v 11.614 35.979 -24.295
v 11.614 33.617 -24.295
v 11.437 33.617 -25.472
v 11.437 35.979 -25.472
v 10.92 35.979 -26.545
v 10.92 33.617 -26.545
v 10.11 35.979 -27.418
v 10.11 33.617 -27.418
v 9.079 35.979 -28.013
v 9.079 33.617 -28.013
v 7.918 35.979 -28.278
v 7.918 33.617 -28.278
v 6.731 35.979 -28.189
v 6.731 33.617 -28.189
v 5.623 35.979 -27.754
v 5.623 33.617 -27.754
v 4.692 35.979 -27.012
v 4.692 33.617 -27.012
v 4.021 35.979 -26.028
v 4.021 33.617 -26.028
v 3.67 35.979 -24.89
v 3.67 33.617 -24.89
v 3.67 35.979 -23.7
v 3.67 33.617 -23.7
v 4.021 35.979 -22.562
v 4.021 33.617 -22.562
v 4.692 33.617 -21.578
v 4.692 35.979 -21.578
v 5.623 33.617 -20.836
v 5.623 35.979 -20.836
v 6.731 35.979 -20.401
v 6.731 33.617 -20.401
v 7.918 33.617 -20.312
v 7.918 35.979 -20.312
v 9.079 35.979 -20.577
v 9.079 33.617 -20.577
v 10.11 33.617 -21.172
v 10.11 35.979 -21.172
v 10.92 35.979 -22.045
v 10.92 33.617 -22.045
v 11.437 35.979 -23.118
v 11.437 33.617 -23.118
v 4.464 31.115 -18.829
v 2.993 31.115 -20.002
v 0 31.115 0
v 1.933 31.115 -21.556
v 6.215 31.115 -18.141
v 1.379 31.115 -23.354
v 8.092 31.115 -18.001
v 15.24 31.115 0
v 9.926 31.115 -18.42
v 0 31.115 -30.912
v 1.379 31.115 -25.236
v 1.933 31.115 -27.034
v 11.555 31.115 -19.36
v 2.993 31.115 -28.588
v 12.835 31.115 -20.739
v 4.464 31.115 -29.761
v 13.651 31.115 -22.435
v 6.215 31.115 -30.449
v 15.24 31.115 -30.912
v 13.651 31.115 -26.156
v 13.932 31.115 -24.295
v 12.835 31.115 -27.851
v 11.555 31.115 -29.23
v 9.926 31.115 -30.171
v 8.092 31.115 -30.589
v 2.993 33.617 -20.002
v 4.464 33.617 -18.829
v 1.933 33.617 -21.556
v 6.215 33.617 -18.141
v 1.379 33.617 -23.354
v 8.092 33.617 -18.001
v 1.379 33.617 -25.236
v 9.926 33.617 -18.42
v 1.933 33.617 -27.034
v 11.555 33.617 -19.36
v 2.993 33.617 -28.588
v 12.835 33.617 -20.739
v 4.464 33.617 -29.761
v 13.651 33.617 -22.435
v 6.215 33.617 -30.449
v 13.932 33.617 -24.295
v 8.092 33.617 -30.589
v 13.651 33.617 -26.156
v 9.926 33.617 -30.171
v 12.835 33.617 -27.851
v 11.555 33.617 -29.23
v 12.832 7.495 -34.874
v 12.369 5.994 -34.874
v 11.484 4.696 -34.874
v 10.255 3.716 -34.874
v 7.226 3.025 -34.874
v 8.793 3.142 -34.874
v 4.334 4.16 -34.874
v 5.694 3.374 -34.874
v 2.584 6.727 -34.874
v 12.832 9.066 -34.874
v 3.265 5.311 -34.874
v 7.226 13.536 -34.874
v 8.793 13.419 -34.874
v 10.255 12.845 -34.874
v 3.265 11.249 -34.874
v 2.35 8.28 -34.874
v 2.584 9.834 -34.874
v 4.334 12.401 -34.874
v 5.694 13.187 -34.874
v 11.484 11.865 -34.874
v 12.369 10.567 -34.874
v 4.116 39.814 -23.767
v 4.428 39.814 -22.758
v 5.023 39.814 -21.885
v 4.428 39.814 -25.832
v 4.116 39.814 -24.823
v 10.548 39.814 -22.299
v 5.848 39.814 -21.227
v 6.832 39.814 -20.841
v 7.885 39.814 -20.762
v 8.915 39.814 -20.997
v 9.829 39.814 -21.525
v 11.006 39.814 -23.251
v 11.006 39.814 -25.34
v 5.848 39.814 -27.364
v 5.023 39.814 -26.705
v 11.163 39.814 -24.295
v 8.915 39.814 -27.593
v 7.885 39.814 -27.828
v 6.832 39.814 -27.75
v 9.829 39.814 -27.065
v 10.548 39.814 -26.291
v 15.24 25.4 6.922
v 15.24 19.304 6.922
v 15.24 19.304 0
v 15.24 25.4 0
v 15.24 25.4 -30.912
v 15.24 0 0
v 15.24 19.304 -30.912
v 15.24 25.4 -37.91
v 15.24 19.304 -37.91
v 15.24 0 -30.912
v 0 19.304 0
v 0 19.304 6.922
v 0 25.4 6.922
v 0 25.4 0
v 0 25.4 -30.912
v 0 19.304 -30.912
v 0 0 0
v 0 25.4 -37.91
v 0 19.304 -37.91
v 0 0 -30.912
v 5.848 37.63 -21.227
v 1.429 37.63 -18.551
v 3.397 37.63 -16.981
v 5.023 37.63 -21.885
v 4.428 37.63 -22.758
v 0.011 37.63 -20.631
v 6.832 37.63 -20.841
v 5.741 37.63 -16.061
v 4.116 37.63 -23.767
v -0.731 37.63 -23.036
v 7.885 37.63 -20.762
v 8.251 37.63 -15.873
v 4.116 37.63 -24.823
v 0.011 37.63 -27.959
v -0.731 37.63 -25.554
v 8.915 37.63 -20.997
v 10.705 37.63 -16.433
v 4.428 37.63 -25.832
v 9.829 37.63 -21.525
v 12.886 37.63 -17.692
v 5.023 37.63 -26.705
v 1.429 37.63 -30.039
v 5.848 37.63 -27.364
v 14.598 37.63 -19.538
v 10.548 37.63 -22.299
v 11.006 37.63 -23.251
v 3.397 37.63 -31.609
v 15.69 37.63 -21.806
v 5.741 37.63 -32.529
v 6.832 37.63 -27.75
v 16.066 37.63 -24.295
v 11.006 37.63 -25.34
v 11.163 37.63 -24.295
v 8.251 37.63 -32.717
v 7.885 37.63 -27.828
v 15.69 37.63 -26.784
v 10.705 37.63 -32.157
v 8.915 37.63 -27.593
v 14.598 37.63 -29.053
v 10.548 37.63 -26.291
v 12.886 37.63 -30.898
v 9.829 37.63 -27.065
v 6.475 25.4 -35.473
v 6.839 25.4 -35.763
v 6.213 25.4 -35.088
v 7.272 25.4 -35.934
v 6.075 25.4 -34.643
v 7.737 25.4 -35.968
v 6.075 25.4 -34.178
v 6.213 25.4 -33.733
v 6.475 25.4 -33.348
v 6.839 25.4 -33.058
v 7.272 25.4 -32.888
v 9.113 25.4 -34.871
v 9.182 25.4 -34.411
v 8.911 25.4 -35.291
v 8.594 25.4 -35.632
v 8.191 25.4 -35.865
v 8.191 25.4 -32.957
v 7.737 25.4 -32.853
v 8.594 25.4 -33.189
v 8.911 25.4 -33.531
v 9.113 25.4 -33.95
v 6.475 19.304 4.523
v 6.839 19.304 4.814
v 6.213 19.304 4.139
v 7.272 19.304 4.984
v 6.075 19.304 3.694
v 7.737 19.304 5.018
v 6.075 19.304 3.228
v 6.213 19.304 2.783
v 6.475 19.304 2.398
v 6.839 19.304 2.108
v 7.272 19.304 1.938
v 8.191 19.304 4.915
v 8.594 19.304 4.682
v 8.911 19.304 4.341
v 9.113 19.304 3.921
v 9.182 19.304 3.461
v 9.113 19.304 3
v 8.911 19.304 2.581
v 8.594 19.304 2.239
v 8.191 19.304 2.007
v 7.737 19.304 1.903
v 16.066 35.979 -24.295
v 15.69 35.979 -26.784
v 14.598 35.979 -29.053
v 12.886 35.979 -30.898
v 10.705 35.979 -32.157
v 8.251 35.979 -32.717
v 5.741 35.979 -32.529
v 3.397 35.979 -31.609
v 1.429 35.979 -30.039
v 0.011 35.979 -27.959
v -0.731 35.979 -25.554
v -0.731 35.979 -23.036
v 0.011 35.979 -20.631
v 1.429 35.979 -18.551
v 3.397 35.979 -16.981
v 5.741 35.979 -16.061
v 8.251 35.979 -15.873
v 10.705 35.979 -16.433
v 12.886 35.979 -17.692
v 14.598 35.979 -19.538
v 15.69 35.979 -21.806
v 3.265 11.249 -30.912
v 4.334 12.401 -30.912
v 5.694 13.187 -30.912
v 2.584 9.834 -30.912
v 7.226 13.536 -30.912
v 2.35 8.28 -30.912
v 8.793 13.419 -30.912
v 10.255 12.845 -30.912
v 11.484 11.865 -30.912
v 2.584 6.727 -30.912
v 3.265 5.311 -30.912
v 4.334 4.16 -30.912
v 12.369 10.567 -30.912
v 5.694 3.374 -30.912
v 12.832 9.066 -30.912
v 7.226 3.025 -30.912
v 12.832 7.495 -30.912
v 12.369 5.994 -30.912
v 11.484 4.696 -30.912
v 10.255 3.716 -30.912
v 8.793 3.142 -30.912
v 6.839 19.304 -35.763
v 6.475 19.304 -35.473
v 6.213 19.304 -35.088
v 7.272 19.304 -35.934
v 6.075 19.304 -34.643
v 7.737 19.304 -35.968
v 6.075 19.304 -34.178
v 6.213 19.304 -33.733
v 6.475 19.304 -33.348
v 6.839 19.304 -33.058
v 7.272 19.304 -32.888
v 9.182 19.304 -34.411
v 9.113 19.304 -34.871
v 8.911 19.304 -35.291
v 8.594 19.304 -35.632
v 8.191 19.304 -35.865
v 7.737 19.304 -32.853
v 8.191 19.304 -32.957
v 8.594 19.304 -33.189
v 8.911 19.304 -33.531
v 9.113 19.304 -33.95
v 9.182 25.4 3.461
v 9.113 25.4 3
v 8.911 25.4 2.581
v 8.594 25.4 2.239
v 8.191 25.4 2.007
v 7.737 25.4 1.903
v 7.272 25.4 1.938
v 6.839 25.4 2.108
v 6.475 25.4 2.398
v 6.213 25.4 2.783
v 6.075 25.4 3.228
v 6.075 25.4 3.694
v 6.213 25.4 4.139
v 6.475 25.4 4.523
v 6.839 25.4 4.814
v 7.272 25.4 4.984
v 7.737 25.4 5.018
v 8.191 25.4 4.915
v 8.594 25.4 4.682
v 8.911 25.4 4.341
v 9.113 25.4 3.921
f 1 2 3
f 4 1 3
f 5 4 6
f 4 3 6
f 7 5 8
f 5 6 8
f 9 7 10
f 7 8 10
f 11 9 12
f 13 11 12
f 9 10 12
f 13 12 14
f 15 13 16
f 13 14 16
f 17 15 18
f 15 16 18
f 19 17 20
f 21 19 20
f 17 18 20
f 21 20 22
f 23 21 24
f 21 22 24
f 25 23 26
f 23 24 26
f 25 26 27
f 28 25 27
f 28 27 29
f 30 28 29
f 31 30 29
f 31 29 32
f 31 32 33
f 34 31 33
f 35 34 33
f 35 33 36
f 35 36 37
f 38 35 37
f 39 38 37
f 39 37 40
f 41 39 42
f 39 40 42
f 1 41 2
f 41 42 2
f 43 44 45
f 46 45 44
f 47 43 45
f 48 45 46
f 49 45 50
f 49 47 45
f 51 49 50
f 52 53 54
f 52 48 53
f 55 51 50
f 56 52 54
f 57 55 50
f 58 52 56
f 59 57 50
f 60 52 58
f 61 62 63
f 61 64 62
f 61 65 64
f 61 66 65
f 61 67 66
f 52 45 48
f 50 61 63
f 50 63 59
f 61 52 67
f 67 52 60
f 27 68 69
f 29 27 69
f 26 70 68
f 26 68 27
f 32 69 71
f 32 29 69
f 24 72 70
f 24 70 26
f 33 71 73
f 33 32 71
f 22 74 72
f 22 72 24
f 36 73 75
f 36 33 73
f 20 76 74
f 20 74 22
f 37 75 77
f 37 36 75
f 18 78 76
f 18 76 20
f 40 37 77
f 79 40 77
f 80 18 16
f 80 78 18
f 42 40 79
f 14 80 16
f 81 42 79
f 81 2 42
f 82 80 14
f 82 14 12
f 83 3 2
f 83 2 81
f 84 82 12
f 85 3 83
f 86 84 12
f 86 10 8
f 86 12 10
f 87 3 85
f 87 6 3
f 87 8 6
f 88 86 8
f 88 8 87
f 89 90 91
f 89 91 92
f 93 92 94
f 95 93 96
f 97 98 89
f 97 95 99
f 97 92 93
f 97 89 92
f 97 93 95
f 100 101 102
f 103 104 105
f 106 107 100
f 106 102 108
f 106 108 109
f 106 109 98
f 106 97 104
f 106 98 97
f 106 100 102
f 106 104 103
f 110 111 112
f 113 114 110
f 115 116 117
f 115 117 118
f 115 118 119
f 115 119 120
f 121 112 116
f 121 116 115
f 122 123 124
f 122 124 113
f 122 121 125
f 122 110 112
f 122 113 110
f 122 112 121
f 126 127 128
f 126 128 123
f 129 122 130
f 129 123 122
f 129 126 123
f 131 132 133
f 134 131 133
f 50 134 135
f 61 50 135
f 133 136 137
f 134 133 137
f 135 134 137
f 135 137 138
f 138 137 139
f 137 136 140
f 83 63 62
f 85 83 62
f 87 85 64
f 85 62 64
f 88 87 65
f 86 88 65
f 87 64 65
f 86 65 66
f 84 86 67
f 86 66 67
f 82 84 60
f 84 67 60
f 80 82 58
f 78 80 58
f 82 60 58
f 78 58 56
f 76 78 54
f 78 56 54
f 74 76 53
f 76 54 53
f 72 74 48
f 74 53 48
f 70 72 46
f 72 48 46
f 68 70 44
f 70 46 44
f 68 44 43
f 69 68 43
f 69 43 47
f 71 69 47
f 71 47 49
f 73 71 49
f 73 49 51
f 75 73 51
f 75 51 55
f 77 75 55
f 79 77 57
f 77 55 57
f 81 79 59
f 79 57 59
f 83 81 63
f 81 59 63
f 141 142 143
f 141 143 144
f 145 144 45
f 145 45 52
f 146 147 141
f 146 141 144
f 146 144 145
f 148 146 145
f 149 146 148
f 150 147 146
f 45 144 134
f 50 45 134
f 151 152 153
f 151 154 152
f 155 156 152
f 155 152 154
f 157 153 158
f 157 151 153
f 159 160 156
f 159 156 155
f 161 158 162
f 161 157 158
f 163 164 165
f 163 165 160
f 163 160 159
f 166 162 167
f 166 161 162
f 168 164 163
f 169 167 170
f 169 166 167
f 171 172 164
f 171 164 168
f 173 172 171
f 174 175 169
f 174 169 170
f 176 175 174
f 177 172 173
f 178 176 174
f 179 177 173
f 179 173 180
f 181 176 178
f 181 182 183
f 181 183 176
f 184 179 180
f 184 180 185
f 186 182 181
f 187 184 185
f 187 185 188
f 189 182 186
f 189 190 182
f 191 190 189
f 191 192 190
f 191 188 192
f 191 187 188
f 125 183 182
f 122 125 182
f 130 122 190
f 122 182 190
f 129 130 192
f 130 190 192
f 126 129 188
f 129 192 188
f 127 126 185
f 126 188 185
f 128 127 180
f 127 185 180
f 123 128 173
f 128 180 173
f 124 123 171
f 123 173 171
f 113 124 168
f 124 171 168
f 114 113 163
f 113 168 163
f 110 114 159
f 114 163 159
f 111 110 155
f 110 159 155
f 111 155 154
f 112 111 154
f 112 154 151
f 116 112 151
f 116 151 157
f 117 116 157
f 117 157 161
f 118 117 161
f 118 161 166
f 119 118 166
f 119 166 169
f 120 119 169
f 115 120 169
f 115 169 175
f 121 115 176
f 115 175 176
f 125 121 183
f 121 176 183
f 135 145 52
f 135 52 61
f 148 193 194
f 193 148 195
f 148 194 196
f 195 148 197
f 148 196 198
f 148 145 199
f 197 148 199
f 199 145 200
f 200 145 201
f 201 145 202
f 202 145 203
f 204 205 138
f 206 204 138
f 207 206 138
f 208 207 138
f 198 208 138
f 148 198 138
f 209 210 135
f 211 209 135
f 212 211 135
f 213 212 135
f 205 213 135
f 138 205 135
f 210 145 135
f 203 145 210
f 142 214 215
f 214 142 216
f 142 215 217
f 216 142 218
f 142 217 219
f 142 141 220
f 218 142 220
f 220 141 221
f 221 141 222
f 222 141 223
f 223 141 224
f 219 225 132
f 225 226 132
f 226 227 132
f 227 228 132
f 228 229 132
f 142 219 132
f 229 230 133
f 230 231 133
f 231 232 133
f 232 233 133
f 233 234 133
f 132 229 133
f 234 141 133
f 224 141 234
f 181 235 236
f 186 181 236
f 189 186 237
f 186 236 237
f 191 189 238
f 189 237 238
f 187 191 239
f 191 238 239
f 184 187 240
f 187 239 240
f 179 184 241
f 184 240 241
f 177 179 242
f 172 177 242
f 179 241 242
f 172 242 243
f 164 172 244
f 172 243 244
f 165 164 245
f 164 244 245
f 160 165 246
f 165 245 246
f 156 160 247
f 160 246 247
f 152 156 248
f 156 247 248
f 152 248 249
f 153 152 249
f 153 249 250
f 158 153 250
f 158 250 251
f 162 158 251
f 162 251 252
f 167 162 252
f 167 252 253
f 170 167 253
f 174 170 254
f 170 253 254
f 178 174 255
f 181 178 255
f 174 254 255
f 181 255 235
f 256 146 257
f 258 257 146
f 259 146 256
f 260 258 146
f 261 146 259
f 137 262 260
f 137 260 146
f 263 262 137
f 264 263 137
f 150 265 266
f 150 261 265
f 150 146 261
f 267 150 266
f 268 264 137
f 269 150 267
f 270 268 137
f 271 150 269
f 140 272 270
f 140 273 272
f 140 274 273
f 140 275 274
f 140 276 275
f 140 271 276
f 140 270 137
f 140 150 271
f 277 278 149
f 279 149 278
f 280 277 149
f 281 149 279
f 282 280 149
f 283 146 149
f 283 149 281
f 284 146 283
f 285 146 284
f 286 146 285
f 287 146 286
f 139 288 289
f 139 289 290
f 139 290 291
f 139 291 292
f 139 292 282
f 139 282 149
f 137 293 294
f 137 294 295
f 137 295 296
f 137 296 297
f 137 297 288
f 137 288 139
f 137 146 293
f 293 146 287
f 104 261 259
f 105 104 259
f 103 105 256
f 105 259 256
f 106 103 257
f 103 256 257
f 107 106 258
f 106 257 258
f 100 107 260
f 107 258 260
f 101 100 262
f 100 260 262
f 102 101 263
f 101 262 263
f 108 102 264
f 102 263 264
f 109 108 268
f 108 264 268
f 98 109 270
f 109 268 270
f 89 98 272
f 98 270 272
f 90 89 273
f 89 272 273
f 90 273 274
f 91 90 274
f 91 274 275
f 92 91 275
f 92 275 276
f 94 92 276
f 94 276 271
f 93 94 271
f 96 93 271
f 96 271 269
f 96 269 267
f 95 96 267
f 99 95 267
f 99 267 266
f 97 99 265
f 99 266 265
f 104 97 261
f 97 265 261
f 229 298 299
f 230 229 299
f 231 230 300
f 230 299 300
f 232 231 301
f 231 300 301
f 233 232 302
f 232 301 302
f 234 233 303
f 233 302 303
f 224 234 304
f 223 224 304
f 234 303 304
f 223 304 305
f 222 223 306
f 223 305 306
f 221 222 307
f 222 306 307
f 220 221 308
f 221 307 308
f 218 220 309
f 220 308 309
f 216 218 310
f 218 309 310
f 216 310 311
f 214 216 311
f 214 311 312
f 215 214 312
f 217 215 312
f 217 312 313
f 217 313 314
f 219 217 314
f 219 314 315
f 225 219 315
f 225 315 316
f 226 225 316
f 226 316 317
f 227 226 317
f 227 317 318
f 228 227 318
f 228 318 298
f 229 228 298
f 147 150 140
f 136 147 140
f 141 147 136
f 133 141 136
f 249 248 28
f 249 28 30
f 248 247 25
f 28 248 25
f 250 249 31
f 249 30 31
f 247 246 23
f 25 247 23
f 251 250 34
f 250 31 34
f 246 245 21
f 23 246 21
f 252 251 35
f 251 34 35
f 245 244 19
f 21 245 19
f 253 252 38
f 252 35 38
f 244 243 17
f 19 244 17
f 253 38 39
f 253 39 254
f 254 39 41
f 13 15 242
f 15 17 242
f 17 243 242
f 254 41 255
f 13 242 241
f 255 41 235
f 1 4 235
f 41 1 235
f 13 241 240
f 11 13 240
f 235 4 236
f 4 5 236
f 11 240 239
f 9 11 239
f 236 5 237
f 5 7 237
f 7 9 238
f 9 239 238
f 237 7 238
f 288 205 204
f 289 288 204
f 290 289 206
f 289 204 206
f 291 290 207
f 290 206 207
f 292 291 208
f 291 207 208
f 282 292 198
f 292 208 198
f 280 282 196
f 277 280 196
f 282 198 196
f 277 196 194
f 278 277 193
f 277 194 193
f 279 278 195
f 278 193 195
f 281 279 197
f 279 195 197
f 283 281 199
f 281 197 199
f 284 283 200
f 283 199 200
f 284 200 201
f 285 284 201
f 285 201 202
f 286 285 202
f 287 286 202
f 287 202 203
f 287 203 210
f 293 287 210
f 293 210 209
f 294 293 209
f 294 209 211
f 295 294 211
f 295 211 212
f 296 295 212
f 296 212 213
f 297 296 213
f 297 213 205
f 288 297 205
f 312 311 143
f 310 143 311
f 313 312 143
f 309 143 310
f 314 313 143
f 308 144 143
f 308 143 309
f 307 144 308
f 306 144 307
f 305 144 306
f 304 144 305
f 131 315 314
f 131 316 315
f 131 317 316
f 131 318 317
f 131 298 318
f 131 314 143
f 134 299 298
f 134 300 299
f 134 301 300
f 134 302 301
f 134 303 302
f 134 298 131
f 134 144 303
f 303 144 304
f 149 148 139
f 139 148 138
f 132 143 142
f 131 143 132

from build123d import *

# Parameters (mm, degrees)
SKETCH1_W                = 15.24
SKETCH1_H                = 30.9118
BOSS_EXTRUDE1_DEPTH      = 31.115
SKETCH2_W                = 15.24
SKETCH2_H                = 6.096
BOSS_EXTRUDE2_DEPTH      = 6.9215
BOSS_EXTRUDE2_DEPTH_BACK = 37.9095
SKETCH3_R                = 5.2705
BOSS_EXTRUDE3_DEPTH      = 3.9624
SKETCH4_R                = 6.3119
BOSS_EXTRUDE4_DEPTH      = 2.5019
SKETCH5_R                = 3.99415
BOSS_EXTRUDE5_DEPTH      = 2.3622
SKETCH6_R                = 8.4455
BOSS_EXTRUDE6_DEPTH      = 1.651
SKETCH7_R                = 3.5433
BOSS_EXTRUDE7_DEPTH      = 2.1844
CUT_EXTRUDE1_REACH       = 27.4
SKETCH8_R                = 1.5621
CUT_EXTRUDE2_REACH       = 27.4
SKETCH9_R                = 1.5621


with BuildPart() as part:
    # Sketch1 → Boss-Extrude1 (new body)
    with BuildSketch(Plane(origin=(0, 0, 0), x_dir=(1, 0, 0), z_dir=(0, 1, 0))):
        with Locations((7.62, 15.4559)):
            Rectangle(SKETCH1_W, SKETCH1_H)
    extrude(amount=BOSS_EXTRUDE1_DEPTH)

    # Sketch2 → Boss-Extrude2 (add, two sides)
    with BuildSketch(Plane.XY) as boss_extrude2_sk:
        with Locations((7.62, 22.352)):
            Rectangle(SKETCH2_W, SKETCH2_H)
    extrude(amount=BOSS_EXTRUDE2_DEPTH)
    extrude(boss_extrude2_sk.sketch, amount=-BOSS_EXTRUDE2_DEPTH_BACK)

    # Sketch3 → Boss-Extrude3 (add)
    with BuildSketch(Plane(origin=(0, 0, -30.9118), x_dir=(-1, 0, 0), z_dir=(0, 0, -1))):
        with Locations((-7.62, 8.2804)):
            Circle(SKETCH3_R)
    extrude(amount=BOSS_EXTRUDE3_DEPTH)

    # Sketch4 → Boss-Extrude4 (add)
    with BuildSketch(Plane(origin=(0, 31.115, 0), x_dir=(1, 0, 0), z_dir=(0, 1, 0))):
        with Locations((7.62, 24.2951)):
            Circle(SKETCH4_R)
    extrude(amount=BOSS_EXTRUDE4_DEPTH)

    # Sketch5 → Boss-Extrude5 (add)
    with BuildSketch(Plane(origin=(0, 33.6169, 0), x_dir=(1, 0, 0), z_dir=(0, 1, 0))):
        with Locations((7.62, 24.2951)):
            Circle(SKETCH5_R)
    extrude(amount=BOSS_EXTRUDE5_DEPTH)

    # Sketch6 → Boss-Extrude6 (add)
    with BuildSketch(Plane(origin=(0, 35.9791, 0), x_dir=(1, 0, 0), z_dir=(0, 1, 0))):
        with Locations((7.62, 24.2951)):
            Circle(SKETCH6_R)
    extrude(amount=BOSS_EXTRUDE6_DEPTH)

    # Sketch7 → Boss-Extrude7 (add)
    with BuildSketch(Plane(origin=(0, 37.6301, 0), x_dir=(1, 0, 0), z_dir=(0, 1, 0))):
        with Locations((7.62, 24.2951)):
            Circle(SKETCH7_R)
    extrude(amount=BOSS_EXTRUDE7_DEPTH)

    # Sketch8 → Cut-Extrude1 (cut, up to next)
    with BuildSketch(Plane(origin=(0, 25.4, 0), x_dir=(1, 0, 0), z_dir=(0, 1, 0)), mode=Mode.PRIVATE) as cut_extrude1_sk1:
        with Locations((7.62, -3.46075)):
            Circle(SKETCH8_R)
    cut_extrude1_tool1 = extrude(cut_extrude1_sk1.sketch, amount=-CUT_EXTRUDE1_REACH, mode=Mode.PRIVATE) & part.part
    add(cut_extrude1_tool1.solids().sort_by_distance((7.62, 25.4, 3.46075))[0], mode=Mode.SUBTRACT)

    # Sketch9 → Cut-Extrude2 (cut, up to next)
    with BuildSketch(Plane(origin=(0, 25.4, 0), x_dir=(1, 0, 0), z_dir=(0, 1, 0)), mode=Mode.PRIVATE) as cut_extrude2_sk1:
        with Locations((7.62, 34.41065)):
            Circle(SKETCH9_R)
    cut_extrude2_tool1 = extrude(cut_extrude2_sk1.sketch, amount=-CUT_EXTRUDE2_REACH, mode=Mode.PRIVATE) & part.part
    add(cut_extrude2_tool1.solids().sort_by_distance((7.62, 25.4, -34.41065))[0], mode=Mode.SUBTRACT)


solid = part.part
